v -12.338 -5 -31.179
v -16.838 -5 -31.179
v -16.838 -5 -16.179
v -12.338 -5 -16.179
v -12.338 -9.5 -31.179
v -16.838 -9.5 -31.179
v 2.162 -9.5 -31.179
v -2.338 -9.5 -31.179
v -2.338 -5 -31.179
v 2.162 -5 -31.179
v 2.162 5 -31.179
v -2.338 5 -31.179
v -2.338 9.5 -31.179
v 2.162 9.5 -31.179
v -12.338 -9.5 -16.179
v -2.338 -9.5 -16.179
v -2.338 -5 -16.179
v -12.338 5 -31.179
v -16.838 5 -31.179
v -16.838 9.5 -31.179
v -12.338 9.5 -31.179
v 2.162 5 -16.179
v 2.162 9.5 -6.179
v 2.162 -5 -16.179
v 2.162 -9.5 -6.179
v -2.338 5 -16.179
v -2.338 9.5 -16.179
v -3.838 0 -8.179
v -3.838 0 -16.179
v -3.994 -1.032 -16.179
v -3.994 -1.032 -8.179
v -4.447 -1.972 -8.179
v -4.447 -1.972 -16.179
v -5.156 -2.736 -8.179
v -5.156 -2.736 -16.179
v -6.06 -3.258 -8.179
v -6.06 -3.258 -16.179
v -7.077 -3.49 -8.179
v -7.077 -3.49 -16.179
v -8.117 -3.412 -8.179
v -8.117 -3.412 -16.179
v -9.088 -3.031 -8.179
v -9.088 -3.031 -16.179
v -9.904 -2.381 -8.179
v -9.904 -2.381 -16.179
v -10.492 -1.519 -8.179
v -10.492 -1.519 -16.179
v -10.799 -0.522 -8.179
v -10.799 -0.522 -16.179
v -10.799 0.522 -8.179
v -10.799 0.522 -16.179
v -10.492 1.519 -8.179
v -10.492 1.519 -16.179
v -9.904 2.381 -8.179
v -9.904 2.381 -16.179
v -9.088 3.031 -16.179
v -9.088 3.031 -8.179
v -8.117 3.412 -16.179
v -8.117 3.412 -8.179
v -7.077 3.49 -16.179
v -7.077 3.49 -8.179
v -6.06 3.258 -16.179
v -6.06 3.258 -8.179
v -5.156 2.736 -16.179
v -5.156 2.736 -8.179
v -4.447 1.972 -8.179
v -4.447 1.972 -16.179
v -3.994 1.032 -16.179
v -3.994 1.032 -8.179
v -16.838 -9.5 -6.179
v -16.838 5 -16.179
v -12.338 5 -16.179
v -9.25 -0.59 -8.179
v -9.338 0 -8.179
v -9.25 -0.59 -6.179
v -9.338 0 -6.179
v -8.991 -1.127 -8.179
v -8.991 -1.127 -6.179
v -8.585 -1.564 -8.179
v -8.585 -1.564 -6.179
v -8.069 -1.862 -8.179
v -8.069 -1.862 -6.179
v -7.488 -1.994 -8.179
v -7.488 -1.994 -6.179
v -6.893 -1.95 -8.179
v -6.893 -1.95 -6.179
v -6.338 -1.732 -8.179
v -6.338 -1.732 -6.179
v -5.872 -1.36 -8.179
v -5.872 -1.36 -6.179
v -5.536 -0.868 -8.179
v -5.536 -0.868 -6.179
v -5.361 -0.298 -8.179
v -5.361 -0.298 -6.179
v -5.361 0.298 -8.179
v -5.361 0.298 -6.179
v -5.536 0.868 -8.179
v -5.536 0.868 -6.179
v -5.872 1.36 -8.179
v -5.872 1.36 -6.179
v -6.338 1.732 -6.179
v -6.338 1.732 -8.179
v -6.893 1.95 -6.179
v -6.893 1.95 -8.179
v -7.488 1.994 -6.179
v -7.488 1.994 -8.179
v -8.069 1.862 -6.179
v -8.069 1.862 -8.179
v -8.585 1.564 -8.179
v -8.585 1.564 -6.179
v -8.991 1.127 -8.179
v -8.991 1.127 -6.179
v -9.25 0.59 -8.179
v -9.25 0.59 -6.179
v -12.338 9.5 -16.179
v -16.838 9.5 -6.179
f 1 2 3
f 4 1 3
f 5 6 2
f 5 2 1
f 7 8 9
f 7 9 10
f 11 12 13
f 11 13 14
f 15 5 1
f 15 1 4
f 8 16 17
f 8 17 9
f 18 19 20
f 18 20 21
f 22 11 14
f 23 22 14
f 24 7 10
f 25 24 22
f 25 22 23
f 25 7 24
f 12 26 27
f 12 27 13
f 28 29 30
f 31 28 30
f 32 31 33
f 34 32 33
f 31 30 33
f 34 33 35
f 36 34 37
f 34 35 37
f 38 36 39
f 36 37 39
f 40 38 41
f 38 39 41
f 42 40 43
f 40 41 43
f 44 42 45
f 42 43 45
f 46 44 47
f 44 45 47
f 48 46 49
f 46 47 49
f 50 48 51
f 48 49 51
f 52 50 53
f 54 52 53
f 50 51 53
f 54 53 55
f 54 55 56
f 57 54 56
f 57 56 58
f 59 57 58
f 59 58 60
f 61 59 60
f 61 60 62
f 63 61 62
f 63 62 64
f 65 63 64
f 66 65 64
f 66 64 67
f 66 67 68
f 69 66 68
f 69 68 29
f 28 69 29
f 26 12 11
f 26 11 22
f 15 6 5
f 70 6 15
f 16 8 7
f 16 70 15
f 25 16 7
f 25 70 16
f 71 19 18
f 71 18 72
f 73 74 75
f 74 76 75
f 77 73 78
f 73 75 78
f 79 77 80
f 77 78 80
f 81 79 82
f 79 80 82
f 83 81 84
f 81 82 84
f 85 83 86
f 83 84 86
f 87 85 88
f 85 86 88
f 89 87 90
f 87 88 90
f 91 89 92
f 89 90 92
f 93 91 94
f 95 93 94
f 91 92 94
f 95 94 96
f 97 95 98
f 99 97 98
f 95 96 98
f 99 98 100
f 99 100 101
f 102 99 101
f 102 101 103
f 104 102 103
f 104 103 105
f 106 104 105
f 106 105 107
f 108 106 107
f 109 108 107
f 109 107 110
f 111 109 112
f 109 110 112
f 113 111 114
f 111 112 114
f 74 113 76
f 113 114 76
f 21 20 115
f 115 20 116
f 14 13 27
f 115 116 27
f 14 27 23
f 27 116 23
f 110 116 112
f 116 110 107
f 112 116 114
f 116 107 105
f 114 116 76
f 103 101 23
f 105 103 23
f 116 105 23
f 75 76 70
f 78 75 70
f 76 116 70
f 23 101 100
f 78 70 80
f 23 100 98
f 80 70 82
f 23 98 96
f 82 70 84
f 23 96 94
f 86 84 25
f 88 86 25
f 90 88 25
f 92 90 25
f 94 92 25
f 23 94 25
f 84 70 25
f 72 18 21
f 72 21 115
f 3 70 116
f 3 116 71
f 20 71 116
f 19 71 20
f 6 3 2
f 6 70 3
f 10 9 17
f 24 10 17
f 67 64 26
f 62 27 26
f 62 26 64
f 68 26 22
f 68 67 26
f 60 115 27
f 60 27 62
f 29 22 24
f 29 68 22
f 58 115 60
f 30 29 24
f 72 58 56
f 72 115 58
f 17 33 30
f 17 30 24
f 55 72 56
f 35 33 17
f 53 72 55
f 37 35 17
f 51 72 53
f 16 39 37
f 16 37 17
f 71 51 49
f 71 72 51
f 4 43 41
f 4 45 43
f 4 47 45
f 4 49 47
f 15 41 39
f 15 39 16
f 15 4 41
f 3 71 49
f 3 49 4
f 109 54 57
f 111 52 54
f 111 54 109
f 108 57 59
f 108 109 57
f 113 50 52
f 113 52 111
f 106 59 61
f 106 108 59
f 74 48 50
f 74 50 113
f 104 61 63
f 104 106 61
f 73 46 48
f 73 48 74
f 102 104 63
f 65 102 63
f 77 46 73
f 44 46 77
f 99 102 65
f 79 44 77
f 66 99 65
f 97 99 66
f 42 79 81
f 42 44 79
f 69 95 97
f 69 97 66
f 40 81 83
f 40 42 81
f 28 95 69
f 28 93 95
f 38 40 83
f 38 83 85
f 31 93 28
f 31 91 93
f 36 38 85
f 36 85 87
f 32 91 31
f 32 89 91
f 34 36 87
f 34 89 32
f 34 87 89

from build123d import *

# Parameters (mm, degrees)
F0_W           = 19
F0_H           = 5
F1_DEPTH       = 9.5
F2_DEPTH       = 9.5
F3_W           = 10
F3_H           = 15
F4_DEPTH       = 25
F6_D           = 4
F6_CBORE_D     = 7
F6_CBORE_DEPTH = 8


with BuildPart() as f1:
    # F0 (on Front) → F1 (new body, symmetric)
    with BuildSketch(Plane.XZ):
        with Locations((-7.338427, -8.679005)):
            Rectangle(F0_W, F0_H)
    extrude(amount=F1_DEPTH, both=True)

    # F0 (on Front) → F2 (join, symmetric)
    with BuildSketch(Plane.XZ):
        Polygon((2.161573, -31.179005), (2.161573, -11.179005), (-16.838427, -11.179005), (-16.838427, -31.179005), (-12.338427, -31.179005), (-12.338427, -16.179005), (-2.338427, -16.179005), (-2.338427, -31.179005), align=None)
    extrude(amount=F2_DEPTH, both=True)

    # F3 (on face) → F4 (cut)
    with BuildSketch(Plane(origin=(-16.838427, 0, 0), x_dir=(0, -1, 0), z_dir=(-1, 0, 0))):
        with Locations((0, -23.679005)):
            Rectangle(F3_W, F3_H)
    extrude(amount=-F4_DEPTH, mode=Mode.SUBTRACT)

    # F6 (through all)
    with Locations(Plane(origin=(0, 0, -16.179005), x_dir=(1, 0, 0), z_dir=(0, 0, -1))):
        with Locations((-7.338427, 0)):
            CounterBoreHole(F6_D / 2, F6_CBORE_D / 2, F6_CBORE_DEPTH)


solid = f1.part
